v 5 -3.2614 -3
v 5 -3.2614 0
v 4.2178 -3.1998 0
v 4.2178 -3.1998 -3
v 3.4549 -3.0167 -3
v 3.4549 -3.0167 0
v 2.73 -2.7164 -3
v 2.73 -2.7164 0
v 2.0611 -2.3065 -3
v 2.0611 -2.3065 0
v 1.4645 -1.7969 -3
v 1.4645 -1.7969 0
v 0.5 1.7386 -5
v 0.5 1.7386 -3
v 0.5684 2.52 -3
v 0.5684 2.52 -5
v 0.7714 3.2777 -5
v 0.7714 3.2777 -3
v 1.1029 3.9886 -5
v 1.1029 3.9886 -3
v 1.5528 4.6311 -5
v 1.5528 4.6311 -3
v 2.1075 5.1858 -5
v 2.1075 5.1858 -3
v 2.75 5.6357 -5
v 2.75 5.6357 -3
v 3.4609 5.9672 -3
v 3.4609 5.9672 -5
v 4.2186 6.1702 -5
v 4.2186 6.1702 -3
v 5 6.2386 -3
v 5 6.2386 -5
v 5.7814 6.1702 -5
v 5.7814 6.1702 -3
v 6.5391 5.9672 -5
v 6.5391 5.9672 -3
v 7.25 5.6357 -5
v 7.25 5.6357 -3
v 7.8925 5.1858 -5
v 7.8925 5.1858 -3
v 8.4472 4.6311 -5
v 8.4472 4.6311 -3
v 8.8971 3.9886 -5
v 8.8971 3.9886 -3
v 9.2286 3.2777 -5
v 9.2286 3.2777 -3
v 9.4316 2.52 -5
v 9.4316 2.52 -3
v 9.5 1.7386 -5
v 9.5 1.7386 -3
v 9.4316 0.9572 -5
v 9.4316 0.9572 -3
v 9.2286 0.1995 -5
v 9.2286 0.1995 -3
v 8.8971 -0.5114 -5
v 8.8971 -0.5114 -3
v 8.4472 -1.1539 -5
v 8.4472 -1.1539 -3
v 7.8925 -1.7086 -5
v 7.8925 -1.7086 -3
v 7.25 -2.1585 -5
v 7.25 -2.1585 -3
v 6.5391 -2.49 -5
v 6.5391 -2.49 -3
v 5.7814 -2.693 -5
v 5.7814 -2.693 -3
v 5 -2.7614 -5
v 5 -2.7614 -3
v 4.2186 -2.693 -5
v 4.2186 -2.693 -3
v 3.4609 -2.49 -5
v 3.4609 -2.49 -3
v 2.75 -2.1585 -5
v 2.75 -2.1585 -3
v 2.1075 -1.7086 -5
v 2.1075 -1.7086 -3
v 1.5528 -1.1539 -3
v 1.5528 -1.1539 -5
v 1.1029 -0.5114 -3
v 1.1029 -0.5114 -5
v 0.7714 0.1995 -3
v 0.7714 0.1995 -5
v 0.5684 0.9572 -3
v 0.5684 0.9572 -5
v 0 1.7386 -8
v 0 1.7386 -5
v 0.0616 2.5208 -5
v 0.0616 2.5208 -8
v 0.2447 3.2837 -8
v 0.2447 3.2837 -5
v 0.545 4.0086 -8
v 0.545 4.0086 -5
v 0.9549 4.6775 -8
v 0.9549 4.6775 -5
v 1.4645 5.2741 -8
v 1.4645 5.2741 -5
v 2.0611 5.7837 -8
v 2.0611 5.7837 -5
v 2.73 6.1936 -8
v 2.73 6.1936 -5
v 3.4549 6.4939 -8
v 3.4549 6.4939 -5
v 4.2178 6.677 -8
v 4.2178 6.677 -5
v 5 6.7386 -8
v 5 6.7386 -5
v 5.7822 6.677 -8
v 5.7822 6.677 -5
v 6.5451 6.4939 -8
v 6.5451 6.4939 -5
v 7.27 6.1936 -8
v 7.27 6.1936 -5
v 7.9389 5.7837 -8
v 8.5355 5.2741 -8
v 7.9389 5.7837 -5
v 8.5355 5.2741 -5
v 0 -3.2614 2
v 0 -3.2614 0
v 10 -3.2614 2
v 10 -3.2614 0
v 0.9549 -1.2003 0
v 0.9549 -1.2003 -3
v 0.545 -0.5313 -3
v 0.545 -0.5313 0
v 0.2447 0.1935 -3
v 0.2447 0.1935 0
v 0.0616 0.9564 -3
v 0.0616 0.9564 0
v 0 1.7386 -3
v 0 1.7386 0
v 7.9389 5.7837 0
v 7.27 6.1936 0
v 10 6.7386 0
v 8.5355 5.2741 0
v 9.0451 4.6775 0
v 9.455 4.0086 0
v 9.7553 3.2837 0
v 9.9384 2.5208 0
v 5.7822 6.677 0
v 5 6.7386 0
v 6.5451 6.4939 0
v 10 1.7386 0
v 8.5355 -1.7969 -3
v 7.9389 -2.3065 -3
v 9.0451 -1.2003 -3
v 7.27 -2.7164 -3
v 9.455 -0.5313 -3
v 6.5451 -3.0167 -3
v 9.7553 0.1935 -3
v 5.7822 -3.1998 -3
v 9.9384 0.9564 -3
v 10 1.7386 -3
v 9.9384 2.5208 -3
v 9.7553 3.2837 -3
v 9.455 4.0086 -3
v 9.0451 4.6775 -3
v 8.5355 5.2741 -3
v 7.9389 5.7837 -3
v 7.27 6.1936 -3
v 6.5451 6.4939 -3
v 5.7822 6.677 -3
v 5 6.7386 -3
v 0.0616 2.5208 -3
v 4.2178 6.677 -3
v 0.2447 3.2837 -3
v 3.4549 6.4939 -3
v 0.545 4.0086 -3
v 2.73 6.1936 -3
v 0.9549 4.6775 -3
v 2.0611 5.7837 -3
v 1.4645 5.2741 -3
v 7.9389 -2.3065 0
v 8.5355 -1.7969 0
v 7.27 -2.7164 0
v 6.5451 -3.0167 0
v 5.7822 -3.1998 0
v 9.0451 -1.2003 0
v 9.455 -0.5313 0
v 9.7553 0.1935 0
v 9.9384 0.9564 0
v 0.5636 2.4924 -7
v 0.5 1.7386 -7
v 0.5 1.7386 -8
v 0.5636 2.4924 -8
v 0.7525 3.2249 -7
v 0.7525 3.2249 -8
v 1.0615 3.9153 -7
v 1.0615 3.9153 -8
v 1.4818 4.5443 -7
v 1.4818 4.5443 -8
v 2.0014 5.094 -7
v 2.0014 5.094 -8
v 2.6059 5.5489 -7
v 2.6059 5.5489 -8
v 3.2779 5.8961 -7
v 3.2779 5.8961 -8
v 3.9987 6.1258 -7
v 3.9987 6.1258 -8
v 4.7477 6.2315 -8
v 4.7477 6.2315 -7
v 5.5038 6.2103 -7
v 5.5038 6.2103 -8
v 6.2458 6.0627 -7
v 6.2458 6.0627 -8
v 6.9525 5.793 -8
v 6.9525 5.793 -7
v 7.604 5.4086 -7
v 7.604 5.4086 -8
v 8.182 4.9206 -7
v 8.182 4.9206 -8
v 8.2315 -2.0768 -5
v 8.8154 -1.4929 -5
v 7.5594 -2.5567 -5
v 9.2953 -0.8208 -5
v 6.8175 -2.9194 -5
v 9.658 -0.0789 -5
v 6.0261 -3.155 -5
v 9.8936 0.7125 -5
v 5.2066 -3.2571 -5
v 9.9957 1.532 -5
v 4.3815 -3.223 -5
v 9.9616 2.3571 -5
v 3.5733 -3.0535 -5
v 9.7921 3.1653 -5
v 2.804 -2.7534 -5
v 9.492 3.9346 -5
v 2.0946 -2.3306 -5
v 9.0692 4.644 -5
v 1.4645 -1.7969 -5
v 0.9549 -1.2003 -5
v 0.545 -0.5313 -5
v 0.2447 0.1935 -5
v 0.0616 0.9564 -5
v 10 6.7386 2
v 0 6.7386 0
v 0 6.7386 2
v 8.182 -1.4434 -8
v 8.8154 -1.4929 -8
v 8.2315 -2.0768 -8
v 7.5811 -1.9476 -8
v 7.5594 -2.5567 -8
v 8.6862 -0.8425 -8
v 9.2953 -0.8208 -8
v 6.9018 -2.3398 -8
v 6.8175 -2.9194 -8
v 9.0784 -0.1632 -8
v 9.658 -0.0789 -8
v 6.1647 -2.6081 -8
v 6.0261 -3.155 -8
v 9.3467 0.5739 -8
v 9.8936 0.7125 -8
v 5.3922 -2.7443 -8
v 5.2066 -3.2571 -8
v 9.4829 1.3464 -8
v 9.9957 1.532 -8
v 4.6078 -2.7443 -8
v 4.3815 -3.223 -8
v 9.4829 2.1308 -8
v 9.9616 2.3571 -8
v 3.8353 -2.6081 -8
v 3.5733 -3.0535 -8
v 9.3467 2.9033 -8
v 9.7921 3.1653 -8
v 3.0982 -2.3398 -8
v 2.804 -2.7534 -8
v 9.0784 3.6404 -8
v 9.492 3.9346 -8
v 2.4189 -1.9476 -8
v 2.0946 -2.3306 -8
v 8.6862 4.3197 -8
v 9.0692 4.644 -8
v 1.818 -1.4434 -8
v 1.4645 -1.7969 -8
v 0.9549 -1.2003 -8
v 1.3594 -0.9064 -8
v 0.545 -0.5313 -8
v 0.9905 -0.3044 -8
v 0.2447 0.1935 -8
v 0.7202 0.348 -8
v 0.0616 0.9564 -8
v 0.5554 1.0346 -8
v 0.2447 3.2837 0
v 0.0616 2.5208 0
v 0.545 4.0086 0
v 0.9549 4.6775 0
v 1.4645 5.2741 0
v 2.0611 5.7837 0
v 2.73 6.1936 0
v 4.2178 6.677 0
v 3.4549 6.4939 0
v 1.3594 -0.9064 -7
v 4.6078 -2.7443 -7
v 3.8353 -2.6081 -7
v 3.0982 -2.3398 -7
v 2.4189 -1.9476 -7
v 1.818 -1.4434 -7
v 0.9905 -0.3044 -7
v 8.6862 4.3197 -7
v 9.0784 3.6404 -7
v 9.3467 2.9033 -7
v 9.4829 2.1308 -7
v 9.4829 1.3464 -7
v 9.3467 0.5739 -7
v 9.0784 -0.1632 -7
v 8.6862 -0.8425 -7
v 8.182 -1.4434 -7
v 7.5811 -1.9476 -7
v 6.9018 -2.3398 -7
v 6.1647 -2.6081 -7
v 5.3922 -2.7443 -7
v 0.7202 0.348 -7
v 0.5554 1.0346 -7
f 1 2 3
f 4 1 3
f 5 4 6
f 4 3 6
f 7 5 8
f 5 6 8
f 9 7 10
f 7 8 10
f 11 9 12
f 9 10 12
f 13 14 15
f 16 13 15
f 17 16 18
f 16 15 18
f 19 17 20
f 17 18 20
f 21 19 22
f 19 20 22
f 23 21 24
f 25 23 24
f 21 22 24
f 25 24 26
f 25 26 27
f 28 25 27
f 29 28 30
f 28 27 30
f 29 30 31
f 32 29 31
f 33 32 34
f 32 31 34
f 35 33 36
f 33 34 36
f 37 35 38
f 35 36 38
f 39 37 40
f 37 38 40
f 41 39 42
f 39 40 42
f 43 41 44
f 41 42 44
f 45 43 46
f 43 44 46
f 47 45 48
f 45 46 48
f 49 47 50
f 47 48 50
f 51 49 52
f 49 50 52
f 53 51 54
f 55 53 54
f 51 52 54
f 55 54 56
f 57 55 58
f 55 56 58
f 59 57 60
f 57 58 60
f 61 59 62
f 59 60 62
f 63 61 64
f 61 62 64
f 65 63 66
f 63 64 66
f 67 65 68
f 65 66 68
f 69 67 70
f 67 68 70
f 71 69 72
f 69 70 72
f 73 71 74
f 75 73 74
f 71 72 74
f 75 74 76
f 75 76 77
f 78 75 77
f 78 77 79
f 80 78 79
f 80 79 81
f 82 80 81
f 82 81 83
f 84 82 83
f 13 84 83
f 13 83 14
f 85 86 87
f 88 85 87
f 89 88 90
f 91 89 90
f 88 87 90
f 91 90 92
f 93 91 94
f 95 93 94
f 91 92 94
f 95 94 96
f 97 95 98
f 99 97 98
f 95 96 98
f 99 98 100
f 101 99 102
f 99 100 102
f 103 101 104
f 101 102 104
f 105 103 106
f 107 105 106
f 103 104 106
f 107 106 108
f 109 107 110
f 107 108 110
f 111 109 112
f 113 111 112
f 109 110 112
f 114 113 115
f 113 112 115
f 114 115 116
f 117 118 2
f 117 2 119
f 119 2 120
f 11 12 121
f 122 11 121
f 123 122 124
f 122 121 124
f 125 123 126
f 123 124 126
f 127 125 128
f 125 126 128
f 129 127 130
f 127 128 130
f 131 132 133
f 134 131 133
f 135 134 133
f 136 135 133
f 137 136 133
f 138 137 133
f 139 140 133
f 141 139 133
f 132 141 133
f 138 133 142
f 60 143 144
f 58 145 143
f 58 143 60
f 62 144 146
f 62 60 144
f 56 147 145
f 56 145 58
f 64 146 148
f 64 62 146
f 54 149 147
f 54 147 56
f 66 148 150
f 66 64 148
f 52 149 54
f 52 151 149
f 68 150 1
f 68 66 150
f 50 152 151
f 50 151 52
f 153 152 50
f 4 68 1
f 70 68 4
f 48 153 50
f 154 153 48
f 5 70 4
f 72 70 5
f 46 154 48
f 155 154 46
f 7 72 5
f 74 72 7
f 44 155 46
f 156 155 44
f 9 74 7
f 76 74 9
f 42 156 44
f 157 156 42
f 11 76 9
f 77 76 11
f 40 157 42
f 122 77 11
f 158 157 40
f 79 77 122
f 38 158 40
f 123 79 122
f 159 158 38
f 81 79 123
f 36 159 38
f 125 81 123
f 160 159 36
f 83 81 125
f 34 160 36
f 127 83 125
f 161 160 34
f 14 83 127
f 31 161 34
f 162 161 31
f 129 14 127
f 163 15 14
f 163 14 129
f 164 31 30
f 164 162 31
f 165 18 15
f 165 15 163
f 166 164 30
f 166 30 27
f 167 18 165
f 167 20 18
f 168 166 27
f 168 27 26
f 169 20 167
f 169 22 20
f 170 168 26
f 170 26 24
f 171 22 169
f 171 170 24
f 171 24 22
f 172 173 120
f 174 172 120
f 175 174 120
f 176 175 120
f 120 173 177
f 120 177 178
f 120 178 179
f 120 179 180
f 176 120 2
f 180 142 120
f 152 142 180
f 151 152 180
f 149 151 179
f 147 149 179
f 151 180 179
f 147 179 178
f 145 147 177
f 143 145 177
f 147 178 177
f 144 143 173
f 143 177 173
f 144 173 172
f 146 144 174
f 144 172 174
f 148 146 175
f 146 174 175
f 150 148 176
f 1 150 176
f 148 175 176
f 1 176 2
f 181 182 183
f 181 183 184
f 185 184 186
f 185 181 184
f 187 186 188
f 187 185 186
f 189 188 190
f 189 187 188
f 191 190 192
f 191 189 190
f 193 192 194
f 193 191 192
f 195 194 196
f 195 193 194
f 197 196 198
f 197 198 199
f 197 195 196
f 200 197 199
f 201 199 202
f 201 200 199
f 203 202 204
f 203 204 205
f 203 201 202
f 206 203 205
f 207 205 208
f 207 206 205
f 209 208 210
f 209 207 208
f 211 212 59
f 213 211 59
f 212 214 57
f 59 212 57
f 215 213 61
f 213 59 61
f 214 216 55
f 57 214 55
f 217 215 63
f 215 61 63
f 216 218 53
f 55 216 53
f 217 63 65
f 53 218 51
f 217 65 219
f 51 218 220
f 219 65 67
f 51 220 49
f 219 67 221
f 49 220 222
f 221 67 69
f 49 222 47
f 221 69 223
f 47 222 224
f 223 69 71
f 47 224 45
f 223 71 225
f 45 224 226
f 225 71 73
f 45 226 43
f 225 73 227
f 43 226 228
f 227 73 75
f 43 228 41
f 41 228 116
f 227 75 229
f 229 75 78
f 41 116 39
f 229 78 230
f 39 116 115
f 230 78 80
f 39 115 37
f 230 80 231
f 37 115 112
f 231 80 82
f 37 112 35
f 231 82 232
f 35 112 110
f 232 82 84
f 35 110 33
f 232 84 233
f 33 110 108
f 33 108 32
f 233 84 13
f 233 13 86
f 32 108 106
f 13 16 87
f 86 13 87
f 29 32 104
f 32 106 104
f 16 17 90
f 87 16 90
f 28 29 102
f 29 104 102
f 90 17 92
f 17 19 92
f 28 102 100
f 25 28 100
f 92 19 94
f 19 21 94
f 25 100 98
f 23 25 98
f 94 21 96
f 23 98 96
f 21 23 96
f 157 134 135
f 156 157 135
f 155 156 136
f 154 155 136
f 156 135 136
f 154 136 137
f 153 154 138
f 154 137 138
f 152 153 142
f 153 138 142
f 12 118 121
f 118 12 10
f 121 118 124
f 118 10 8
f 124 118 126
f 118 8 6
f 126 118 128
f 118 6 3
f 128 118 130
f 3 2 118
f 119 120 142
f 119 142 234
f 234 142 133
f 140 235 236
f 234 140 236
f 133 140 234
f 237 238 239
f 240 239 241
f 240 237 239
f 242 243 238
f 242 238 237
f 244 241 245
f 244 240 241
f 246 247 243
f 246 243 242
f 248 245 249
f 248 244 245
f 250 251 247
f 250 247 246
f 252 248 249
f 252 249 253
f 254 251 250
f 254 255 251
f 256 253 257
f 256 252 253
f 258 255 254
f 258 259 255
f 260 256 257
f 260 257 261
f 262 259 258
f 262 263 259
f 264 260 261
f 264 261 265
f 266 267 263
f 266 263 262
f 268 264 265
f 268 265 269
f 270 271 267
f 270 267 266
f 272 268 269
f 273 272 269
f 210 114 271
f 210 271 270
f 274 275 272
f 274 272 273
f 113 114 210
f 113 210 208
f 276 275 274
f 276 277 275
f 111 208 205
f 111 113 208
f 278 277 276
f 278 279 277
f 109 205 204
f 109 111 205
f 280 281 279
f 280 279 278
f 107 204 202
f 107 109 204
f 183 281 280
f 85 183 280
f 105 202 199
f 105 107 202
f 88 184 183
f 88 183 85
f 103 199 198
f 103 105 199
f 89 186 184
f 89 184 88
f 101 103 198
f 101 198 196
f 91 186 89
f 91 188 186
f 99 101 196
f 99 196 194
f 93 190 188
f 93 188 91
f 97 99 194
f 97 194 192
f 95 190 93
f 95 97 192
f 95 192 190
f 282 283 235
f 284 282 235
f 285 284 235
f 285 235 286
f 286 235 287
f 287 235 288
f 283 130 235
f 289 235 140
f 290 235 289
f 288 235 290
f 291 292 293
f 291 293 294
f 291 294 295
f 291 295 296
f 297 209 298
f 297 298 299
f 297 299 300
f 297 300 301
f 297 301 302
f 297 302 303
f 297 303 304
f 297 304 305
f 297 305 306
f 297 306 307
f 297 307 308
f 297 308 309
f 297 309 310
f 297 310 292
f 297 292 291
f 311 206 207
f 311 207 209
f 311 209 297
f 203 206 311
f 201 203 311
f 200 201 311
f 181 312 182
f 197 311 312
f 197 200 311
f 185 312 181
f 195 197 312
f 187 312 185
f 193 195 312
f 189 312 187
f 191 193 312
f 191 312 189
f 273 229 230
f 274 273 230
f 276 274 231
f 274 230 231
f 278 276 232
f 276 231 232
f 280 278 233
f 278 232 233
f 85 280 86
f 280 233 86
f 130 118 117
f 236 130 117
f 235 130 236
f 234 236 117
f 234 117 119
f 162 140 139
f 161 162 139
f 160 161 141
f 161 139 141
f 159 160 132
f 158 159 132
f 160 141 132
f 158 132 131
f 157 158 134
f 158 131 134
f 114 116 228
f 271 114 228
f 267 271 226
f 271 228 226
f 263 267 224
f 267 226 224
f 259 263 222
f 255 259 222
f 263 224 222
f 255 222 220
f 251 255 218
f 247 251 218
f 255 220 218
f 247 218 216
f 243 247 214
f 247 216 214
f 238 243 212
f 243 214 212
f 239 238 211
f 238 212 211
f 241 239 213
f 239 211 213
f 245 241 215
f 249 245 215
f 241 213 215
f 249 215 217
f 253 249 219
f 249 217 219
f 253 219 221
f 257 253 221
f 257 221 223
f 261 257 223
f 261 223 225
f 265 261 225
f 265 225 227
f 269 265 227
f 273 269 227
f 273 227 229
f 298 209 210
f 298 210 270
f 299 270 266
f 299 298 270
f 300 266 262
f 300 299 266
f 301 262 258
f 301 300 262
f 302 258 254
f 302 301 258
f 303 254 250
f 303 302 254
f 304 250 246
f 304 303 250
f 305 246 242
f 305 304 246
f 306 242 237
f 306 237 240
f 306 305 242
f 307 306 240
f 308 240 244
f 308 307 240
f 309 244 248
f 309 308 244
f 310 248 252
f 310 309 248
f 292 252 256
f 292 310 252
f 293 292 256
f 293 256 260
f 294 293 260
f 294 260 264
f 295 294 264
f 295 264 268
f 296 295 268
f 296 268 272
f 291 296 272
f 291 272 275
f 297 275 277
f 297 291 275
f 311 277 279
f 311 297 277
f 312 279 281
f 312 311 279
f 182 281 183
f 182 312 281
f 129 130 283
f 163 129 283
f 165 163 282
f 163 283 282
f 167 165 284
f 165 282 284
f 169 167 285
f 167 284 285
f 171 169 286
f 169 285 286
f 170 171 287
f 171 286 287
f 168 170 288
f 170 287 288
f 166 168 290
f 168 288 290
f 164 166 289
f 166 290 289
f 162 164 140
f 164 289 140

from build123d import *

# Parameters (mm, degrees)
ESQUISSE1_W             = 10
ESQUISSE1_H             = 10
BOSS_EXTRU_1_DEPTH      = 2
BOSS_EXTRU_2_DEPTH      = 3
ESQUISSE3_R             = 4.5
BOSS_EXTRU_3_DEPTH      = 2
BOSS_EXTRU_5_DEPTH      = 3
ENL_V_START             = -1
ENL_V_MAT_EXTRU_1_DEPTH = 1


with BuildPart() as part:
    # Esquisse1 → Boss.-Extru.1 (new body)
    with BuildSketch(Plane.XY):
        with Locations((5, 1.73860374)):
            Rectangle(ESQUISSE1_W, ESQUISSE1_H)
    extrude(amount=BOSS_EXTRU_1_DEPTH)

    # Esquisse2 → Boss.-Extru.2 (add)
    with BuildSketch(Plane(origin=(0, 0, 0), x_dir=(-1, 0, 0), z_dir=(0, 0, -1))):
        with BuildLine():
            ThreePointArc((-5, 6.73860374), (-6.913417162, 6.358001403), (-8.535533906, 5.274137646))
            Line((-8.535533906, 5.274137646), (-1.464466094, -1.796930166))
            ThreePointArc((-1.464466094, -1.796930166), (-0.380602337, -0.174813421), (0, 1.73860374))
            ThreePointArc((0, 1.73860374), (-1.464466094, 5.274137646), (-5, 6.73860374))
        make_face()
        with BuildLine():
            Line((-1.464466094, -1.796930166), (-8.535533906, 5.274137646))
            ThreePointArc((-8.535533906, 5.274137646), (-9.619397663, 3.652020902), (-10, 1.73860374))
            ThreePointArc((-10, 1.73860374), (-8.535533906, -1.796930166), (-5, -3.26139626))
            ThreePointArc((-5, -3.26139626), (-3.086582838, -2.880793922), (-1.464466094, -1.796930166))
        make_face()
    extrude(amount=BOSS_EXTRU_2_DEPTH)

    # Esquisse3 → Boss.-Extru.3 (add)
    with BuildSketch(Plane(origin=(0, 0, -3), x_dir=(-1, 0, 0), z_dir=(0, 0, -1))):
        with Locations((-5, 1.73860374)):
            Circle(ESQUISSE3_R)
    extrude(amount=BOSS_EXTRU_3_DEPTH)

    # Esquisse4 → Boss.-Extru.5 (add)
    with BuildSketch(Plane(origin=(0, 0, -5), x_dir=(-1, 0, 0), z_dir=(0, 0, -1))):
        with BuildLine():
            ThreePointArc((0, 1.73860374), (-3.086582838, 6.358001403), (-8.535533906, 5.274137646))
            Line((-8.535533906, 5.274137646), (-8.181980515, 4.920584256))
            ThreePointArc((-8.181980515, 4.920584256), (-3.277924554, 5.896061637), (-0.5, 1.73860374))
            ThreePointArc((-0.5, 1.73860374), (-0.842542104, 0.016528295), (-1.818019485, -1.443376775))
            Line((-1.818019485, -1.443376775), (-1.464466094, -1.796930166))
            ThreePointArc((-1.464466094, -1.796930166), (-0.380602337, -0.174813421), (0, 1.73860374))
        make_face()
        with BuildLine():
            Line((-8.181980515, 4.920584256), (-8.535533906, 5.274137646))
            ThreePointArc((-8.535533906, 5.274137646), (-8.535533906, -1.796930166), (-1.464466094, -1.796930166))
            Line((-1.464466094, -1.796930166), (-1.818019485, -1.443376775))
            ThreePointArc((-1.818019485, -1.443376775), (-8.181980515, -1.443376775), (-8.181980515, 4.920584256))
        make_face()
        with BuildLine():
            ThreePointArc((-0.5, 1.73860374), (-3.277924554, 5.896061637), (-8.181980515, 4.920584256))
            Line((-8.181980515, 4.920584256), (-1.818019485, -1.443376775))
            ThreePointArc((-1.818019485, -1.443376775), (-0.842542104, 0.016528295), (-0.5, 1.73860374))
        make_face()
        with BuildLine():
            Line((-1.818019485, -1.443376775), (-8.181980515, 4.920584256))
            ThreePointArc((-8.181980515, 4.920584256), (-8.181980515, -1.443376775), (-1.818019485, -1.443376775))
        make_face()
    extrude(amount=BOSS_EXTRU_5_DEPTH)

    # Esquisse5 → Enlèv. mat.-Extru.1 (cut)
    with BuildSketch(Plane(origin=(0, 0, -8), x_dir=(-1, 0, 0), z_dir=(0, 0, -1)).offset(ENL_V_START)):
        with BuildLine():
            ThreePointArc((-0.5, 1.73860374), (-3.277924554, 5.896061637), (-8.181980515, 4.920584256))
            Line((-8.181980515, 4.920584256), (-1.818019485, -1.443376775))
            ThreePointArc((-1.818019485, -1.443376775), (-0.842542104, 0.016528295), (-0.5, 1.73860374))
        make_face()
        with BuildLine():
            Line((-1.818019485, -1.443376775), (-8.181980515, 4.920584256))
            ThreePointArc((-8.181980515, 4.920584256), (-8.181980515, -1.443376775), (-1.818019485, -1.443376775))
        make_face()
    extrude(amount=ENL_V_MAT_EXTRU_1_DEPTH, mode=Mode.SUBTRACT)


solid = part.part
